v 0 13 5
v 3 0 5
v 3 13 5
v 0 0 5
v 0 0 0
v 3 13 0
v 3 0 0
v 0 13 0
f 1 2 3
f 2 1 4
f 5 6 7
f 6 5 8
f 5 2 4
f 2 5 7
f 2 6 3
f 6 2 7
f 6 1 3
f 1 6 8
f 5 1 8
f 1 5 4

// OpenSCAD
// Generated by SolidPython 1.0.1 on 2020-07-29 00:46:54


cube(size = [3, 13, 5]);
/***********************************************
*********      SolidPython code:      **********
************************************************
 
# import packages: SolidPython
from solid import *
from solid.utils import *
from itertools import chain, combinations, permutations


class Resize:

    def __init__(self, scad_file):
        self.scad_file = scad_file
        #self.scad_file = import_scad(scad_file)
        # cone/cylinder param:
        self.r1 = 0
        self.r2 = 0
        self.h = 0
        # rectangular prism param:
        self.w = 0
        self.l = 0
        # ellipse param:
        self.r = 0

    # import OpenScad code (file name corresponds to shape)


    # classify shape + parameters
    def assign(self, param1, param2, param3):
        if self.scad_file == 'cone.scad':
            self.r1 = param1
            self.r2 = param2
            self.h = param3
        elif self.scad_file == 'cylinder.scad':
            self.r1 = param1
            self.r2 = param2
            self.h = param3
        elif self.scad_file == 'rectangularPrism.scad':
            self.h = param1
            self.l = param2
            self.w = param3
        else:
            self.r = param1
            self.h = param2

    # resize parameters
    def iterate(self):
        x = range(3, 20, 2)
        i = 1
        if self.scad_file == 'cone.scad':
            tempList = list(permutations(x, 2))
            for temp in tempList:
                param1 = temp[0]
                param2 = temp[1]
                filepath = 'produced_scad_files/' + 'cone' + str(param1) + '_' + str(param2) + '_' + '.scad'
                scad_render_to_file(cylinder(h=param1, r1=param2, r2=0), filepath)

        elif self.scad_file == 'cylinder.scad':
            tempList = list(permutations(x, 3))
            for temp in tempList:
                param1 = temp[0]
                param2 = temp[1]
                filepath = 'produced_scad_files/' + 'cylinder' + str(param1) + '_' + str(param2) + '_' + '.scad'
                scad_render_to_file(cylinder(h=param1, r1=param2, r2=param2), filepath)

        elif self.scad_file == 'rectangularPrism.scad':
            tempList = list(permutations(x, 3))
            for temp in tempList:
                param1 = temp[0]
                param2 = temp[1]
                param3 = temp[2]
                filepath = 'produced_scad_files/' + 'rectangularPrism' + str(param1) + '_' + str(param2) + '_' + str(
                    param3) + '.scad'
                scad_render_to_file(cube(size=(param1, param2, param3)), filepath)

        elif self.scad_file == 'ellipse.scad':
            tempList = list(permutations(x, 4))
            for temp in tempList:
                param1 = temp[0]
                param2 = temp[1]
                param3 = temp[2]
                param4 = temp[3]
                filepath = 'produced_scad_files/' + 'ellipse' + str(param1) + '_' + str(param2) + '_' + str(param3) + '_' + str(param4) + '.scad'
                scad_render_to_file(scale([param1, param2, param3])(sphere(r=param4)), filepath)

    def render_to_scadfile(self):
        scad_render_to_file(scad, 'example.scad') 
 
************************************************/
